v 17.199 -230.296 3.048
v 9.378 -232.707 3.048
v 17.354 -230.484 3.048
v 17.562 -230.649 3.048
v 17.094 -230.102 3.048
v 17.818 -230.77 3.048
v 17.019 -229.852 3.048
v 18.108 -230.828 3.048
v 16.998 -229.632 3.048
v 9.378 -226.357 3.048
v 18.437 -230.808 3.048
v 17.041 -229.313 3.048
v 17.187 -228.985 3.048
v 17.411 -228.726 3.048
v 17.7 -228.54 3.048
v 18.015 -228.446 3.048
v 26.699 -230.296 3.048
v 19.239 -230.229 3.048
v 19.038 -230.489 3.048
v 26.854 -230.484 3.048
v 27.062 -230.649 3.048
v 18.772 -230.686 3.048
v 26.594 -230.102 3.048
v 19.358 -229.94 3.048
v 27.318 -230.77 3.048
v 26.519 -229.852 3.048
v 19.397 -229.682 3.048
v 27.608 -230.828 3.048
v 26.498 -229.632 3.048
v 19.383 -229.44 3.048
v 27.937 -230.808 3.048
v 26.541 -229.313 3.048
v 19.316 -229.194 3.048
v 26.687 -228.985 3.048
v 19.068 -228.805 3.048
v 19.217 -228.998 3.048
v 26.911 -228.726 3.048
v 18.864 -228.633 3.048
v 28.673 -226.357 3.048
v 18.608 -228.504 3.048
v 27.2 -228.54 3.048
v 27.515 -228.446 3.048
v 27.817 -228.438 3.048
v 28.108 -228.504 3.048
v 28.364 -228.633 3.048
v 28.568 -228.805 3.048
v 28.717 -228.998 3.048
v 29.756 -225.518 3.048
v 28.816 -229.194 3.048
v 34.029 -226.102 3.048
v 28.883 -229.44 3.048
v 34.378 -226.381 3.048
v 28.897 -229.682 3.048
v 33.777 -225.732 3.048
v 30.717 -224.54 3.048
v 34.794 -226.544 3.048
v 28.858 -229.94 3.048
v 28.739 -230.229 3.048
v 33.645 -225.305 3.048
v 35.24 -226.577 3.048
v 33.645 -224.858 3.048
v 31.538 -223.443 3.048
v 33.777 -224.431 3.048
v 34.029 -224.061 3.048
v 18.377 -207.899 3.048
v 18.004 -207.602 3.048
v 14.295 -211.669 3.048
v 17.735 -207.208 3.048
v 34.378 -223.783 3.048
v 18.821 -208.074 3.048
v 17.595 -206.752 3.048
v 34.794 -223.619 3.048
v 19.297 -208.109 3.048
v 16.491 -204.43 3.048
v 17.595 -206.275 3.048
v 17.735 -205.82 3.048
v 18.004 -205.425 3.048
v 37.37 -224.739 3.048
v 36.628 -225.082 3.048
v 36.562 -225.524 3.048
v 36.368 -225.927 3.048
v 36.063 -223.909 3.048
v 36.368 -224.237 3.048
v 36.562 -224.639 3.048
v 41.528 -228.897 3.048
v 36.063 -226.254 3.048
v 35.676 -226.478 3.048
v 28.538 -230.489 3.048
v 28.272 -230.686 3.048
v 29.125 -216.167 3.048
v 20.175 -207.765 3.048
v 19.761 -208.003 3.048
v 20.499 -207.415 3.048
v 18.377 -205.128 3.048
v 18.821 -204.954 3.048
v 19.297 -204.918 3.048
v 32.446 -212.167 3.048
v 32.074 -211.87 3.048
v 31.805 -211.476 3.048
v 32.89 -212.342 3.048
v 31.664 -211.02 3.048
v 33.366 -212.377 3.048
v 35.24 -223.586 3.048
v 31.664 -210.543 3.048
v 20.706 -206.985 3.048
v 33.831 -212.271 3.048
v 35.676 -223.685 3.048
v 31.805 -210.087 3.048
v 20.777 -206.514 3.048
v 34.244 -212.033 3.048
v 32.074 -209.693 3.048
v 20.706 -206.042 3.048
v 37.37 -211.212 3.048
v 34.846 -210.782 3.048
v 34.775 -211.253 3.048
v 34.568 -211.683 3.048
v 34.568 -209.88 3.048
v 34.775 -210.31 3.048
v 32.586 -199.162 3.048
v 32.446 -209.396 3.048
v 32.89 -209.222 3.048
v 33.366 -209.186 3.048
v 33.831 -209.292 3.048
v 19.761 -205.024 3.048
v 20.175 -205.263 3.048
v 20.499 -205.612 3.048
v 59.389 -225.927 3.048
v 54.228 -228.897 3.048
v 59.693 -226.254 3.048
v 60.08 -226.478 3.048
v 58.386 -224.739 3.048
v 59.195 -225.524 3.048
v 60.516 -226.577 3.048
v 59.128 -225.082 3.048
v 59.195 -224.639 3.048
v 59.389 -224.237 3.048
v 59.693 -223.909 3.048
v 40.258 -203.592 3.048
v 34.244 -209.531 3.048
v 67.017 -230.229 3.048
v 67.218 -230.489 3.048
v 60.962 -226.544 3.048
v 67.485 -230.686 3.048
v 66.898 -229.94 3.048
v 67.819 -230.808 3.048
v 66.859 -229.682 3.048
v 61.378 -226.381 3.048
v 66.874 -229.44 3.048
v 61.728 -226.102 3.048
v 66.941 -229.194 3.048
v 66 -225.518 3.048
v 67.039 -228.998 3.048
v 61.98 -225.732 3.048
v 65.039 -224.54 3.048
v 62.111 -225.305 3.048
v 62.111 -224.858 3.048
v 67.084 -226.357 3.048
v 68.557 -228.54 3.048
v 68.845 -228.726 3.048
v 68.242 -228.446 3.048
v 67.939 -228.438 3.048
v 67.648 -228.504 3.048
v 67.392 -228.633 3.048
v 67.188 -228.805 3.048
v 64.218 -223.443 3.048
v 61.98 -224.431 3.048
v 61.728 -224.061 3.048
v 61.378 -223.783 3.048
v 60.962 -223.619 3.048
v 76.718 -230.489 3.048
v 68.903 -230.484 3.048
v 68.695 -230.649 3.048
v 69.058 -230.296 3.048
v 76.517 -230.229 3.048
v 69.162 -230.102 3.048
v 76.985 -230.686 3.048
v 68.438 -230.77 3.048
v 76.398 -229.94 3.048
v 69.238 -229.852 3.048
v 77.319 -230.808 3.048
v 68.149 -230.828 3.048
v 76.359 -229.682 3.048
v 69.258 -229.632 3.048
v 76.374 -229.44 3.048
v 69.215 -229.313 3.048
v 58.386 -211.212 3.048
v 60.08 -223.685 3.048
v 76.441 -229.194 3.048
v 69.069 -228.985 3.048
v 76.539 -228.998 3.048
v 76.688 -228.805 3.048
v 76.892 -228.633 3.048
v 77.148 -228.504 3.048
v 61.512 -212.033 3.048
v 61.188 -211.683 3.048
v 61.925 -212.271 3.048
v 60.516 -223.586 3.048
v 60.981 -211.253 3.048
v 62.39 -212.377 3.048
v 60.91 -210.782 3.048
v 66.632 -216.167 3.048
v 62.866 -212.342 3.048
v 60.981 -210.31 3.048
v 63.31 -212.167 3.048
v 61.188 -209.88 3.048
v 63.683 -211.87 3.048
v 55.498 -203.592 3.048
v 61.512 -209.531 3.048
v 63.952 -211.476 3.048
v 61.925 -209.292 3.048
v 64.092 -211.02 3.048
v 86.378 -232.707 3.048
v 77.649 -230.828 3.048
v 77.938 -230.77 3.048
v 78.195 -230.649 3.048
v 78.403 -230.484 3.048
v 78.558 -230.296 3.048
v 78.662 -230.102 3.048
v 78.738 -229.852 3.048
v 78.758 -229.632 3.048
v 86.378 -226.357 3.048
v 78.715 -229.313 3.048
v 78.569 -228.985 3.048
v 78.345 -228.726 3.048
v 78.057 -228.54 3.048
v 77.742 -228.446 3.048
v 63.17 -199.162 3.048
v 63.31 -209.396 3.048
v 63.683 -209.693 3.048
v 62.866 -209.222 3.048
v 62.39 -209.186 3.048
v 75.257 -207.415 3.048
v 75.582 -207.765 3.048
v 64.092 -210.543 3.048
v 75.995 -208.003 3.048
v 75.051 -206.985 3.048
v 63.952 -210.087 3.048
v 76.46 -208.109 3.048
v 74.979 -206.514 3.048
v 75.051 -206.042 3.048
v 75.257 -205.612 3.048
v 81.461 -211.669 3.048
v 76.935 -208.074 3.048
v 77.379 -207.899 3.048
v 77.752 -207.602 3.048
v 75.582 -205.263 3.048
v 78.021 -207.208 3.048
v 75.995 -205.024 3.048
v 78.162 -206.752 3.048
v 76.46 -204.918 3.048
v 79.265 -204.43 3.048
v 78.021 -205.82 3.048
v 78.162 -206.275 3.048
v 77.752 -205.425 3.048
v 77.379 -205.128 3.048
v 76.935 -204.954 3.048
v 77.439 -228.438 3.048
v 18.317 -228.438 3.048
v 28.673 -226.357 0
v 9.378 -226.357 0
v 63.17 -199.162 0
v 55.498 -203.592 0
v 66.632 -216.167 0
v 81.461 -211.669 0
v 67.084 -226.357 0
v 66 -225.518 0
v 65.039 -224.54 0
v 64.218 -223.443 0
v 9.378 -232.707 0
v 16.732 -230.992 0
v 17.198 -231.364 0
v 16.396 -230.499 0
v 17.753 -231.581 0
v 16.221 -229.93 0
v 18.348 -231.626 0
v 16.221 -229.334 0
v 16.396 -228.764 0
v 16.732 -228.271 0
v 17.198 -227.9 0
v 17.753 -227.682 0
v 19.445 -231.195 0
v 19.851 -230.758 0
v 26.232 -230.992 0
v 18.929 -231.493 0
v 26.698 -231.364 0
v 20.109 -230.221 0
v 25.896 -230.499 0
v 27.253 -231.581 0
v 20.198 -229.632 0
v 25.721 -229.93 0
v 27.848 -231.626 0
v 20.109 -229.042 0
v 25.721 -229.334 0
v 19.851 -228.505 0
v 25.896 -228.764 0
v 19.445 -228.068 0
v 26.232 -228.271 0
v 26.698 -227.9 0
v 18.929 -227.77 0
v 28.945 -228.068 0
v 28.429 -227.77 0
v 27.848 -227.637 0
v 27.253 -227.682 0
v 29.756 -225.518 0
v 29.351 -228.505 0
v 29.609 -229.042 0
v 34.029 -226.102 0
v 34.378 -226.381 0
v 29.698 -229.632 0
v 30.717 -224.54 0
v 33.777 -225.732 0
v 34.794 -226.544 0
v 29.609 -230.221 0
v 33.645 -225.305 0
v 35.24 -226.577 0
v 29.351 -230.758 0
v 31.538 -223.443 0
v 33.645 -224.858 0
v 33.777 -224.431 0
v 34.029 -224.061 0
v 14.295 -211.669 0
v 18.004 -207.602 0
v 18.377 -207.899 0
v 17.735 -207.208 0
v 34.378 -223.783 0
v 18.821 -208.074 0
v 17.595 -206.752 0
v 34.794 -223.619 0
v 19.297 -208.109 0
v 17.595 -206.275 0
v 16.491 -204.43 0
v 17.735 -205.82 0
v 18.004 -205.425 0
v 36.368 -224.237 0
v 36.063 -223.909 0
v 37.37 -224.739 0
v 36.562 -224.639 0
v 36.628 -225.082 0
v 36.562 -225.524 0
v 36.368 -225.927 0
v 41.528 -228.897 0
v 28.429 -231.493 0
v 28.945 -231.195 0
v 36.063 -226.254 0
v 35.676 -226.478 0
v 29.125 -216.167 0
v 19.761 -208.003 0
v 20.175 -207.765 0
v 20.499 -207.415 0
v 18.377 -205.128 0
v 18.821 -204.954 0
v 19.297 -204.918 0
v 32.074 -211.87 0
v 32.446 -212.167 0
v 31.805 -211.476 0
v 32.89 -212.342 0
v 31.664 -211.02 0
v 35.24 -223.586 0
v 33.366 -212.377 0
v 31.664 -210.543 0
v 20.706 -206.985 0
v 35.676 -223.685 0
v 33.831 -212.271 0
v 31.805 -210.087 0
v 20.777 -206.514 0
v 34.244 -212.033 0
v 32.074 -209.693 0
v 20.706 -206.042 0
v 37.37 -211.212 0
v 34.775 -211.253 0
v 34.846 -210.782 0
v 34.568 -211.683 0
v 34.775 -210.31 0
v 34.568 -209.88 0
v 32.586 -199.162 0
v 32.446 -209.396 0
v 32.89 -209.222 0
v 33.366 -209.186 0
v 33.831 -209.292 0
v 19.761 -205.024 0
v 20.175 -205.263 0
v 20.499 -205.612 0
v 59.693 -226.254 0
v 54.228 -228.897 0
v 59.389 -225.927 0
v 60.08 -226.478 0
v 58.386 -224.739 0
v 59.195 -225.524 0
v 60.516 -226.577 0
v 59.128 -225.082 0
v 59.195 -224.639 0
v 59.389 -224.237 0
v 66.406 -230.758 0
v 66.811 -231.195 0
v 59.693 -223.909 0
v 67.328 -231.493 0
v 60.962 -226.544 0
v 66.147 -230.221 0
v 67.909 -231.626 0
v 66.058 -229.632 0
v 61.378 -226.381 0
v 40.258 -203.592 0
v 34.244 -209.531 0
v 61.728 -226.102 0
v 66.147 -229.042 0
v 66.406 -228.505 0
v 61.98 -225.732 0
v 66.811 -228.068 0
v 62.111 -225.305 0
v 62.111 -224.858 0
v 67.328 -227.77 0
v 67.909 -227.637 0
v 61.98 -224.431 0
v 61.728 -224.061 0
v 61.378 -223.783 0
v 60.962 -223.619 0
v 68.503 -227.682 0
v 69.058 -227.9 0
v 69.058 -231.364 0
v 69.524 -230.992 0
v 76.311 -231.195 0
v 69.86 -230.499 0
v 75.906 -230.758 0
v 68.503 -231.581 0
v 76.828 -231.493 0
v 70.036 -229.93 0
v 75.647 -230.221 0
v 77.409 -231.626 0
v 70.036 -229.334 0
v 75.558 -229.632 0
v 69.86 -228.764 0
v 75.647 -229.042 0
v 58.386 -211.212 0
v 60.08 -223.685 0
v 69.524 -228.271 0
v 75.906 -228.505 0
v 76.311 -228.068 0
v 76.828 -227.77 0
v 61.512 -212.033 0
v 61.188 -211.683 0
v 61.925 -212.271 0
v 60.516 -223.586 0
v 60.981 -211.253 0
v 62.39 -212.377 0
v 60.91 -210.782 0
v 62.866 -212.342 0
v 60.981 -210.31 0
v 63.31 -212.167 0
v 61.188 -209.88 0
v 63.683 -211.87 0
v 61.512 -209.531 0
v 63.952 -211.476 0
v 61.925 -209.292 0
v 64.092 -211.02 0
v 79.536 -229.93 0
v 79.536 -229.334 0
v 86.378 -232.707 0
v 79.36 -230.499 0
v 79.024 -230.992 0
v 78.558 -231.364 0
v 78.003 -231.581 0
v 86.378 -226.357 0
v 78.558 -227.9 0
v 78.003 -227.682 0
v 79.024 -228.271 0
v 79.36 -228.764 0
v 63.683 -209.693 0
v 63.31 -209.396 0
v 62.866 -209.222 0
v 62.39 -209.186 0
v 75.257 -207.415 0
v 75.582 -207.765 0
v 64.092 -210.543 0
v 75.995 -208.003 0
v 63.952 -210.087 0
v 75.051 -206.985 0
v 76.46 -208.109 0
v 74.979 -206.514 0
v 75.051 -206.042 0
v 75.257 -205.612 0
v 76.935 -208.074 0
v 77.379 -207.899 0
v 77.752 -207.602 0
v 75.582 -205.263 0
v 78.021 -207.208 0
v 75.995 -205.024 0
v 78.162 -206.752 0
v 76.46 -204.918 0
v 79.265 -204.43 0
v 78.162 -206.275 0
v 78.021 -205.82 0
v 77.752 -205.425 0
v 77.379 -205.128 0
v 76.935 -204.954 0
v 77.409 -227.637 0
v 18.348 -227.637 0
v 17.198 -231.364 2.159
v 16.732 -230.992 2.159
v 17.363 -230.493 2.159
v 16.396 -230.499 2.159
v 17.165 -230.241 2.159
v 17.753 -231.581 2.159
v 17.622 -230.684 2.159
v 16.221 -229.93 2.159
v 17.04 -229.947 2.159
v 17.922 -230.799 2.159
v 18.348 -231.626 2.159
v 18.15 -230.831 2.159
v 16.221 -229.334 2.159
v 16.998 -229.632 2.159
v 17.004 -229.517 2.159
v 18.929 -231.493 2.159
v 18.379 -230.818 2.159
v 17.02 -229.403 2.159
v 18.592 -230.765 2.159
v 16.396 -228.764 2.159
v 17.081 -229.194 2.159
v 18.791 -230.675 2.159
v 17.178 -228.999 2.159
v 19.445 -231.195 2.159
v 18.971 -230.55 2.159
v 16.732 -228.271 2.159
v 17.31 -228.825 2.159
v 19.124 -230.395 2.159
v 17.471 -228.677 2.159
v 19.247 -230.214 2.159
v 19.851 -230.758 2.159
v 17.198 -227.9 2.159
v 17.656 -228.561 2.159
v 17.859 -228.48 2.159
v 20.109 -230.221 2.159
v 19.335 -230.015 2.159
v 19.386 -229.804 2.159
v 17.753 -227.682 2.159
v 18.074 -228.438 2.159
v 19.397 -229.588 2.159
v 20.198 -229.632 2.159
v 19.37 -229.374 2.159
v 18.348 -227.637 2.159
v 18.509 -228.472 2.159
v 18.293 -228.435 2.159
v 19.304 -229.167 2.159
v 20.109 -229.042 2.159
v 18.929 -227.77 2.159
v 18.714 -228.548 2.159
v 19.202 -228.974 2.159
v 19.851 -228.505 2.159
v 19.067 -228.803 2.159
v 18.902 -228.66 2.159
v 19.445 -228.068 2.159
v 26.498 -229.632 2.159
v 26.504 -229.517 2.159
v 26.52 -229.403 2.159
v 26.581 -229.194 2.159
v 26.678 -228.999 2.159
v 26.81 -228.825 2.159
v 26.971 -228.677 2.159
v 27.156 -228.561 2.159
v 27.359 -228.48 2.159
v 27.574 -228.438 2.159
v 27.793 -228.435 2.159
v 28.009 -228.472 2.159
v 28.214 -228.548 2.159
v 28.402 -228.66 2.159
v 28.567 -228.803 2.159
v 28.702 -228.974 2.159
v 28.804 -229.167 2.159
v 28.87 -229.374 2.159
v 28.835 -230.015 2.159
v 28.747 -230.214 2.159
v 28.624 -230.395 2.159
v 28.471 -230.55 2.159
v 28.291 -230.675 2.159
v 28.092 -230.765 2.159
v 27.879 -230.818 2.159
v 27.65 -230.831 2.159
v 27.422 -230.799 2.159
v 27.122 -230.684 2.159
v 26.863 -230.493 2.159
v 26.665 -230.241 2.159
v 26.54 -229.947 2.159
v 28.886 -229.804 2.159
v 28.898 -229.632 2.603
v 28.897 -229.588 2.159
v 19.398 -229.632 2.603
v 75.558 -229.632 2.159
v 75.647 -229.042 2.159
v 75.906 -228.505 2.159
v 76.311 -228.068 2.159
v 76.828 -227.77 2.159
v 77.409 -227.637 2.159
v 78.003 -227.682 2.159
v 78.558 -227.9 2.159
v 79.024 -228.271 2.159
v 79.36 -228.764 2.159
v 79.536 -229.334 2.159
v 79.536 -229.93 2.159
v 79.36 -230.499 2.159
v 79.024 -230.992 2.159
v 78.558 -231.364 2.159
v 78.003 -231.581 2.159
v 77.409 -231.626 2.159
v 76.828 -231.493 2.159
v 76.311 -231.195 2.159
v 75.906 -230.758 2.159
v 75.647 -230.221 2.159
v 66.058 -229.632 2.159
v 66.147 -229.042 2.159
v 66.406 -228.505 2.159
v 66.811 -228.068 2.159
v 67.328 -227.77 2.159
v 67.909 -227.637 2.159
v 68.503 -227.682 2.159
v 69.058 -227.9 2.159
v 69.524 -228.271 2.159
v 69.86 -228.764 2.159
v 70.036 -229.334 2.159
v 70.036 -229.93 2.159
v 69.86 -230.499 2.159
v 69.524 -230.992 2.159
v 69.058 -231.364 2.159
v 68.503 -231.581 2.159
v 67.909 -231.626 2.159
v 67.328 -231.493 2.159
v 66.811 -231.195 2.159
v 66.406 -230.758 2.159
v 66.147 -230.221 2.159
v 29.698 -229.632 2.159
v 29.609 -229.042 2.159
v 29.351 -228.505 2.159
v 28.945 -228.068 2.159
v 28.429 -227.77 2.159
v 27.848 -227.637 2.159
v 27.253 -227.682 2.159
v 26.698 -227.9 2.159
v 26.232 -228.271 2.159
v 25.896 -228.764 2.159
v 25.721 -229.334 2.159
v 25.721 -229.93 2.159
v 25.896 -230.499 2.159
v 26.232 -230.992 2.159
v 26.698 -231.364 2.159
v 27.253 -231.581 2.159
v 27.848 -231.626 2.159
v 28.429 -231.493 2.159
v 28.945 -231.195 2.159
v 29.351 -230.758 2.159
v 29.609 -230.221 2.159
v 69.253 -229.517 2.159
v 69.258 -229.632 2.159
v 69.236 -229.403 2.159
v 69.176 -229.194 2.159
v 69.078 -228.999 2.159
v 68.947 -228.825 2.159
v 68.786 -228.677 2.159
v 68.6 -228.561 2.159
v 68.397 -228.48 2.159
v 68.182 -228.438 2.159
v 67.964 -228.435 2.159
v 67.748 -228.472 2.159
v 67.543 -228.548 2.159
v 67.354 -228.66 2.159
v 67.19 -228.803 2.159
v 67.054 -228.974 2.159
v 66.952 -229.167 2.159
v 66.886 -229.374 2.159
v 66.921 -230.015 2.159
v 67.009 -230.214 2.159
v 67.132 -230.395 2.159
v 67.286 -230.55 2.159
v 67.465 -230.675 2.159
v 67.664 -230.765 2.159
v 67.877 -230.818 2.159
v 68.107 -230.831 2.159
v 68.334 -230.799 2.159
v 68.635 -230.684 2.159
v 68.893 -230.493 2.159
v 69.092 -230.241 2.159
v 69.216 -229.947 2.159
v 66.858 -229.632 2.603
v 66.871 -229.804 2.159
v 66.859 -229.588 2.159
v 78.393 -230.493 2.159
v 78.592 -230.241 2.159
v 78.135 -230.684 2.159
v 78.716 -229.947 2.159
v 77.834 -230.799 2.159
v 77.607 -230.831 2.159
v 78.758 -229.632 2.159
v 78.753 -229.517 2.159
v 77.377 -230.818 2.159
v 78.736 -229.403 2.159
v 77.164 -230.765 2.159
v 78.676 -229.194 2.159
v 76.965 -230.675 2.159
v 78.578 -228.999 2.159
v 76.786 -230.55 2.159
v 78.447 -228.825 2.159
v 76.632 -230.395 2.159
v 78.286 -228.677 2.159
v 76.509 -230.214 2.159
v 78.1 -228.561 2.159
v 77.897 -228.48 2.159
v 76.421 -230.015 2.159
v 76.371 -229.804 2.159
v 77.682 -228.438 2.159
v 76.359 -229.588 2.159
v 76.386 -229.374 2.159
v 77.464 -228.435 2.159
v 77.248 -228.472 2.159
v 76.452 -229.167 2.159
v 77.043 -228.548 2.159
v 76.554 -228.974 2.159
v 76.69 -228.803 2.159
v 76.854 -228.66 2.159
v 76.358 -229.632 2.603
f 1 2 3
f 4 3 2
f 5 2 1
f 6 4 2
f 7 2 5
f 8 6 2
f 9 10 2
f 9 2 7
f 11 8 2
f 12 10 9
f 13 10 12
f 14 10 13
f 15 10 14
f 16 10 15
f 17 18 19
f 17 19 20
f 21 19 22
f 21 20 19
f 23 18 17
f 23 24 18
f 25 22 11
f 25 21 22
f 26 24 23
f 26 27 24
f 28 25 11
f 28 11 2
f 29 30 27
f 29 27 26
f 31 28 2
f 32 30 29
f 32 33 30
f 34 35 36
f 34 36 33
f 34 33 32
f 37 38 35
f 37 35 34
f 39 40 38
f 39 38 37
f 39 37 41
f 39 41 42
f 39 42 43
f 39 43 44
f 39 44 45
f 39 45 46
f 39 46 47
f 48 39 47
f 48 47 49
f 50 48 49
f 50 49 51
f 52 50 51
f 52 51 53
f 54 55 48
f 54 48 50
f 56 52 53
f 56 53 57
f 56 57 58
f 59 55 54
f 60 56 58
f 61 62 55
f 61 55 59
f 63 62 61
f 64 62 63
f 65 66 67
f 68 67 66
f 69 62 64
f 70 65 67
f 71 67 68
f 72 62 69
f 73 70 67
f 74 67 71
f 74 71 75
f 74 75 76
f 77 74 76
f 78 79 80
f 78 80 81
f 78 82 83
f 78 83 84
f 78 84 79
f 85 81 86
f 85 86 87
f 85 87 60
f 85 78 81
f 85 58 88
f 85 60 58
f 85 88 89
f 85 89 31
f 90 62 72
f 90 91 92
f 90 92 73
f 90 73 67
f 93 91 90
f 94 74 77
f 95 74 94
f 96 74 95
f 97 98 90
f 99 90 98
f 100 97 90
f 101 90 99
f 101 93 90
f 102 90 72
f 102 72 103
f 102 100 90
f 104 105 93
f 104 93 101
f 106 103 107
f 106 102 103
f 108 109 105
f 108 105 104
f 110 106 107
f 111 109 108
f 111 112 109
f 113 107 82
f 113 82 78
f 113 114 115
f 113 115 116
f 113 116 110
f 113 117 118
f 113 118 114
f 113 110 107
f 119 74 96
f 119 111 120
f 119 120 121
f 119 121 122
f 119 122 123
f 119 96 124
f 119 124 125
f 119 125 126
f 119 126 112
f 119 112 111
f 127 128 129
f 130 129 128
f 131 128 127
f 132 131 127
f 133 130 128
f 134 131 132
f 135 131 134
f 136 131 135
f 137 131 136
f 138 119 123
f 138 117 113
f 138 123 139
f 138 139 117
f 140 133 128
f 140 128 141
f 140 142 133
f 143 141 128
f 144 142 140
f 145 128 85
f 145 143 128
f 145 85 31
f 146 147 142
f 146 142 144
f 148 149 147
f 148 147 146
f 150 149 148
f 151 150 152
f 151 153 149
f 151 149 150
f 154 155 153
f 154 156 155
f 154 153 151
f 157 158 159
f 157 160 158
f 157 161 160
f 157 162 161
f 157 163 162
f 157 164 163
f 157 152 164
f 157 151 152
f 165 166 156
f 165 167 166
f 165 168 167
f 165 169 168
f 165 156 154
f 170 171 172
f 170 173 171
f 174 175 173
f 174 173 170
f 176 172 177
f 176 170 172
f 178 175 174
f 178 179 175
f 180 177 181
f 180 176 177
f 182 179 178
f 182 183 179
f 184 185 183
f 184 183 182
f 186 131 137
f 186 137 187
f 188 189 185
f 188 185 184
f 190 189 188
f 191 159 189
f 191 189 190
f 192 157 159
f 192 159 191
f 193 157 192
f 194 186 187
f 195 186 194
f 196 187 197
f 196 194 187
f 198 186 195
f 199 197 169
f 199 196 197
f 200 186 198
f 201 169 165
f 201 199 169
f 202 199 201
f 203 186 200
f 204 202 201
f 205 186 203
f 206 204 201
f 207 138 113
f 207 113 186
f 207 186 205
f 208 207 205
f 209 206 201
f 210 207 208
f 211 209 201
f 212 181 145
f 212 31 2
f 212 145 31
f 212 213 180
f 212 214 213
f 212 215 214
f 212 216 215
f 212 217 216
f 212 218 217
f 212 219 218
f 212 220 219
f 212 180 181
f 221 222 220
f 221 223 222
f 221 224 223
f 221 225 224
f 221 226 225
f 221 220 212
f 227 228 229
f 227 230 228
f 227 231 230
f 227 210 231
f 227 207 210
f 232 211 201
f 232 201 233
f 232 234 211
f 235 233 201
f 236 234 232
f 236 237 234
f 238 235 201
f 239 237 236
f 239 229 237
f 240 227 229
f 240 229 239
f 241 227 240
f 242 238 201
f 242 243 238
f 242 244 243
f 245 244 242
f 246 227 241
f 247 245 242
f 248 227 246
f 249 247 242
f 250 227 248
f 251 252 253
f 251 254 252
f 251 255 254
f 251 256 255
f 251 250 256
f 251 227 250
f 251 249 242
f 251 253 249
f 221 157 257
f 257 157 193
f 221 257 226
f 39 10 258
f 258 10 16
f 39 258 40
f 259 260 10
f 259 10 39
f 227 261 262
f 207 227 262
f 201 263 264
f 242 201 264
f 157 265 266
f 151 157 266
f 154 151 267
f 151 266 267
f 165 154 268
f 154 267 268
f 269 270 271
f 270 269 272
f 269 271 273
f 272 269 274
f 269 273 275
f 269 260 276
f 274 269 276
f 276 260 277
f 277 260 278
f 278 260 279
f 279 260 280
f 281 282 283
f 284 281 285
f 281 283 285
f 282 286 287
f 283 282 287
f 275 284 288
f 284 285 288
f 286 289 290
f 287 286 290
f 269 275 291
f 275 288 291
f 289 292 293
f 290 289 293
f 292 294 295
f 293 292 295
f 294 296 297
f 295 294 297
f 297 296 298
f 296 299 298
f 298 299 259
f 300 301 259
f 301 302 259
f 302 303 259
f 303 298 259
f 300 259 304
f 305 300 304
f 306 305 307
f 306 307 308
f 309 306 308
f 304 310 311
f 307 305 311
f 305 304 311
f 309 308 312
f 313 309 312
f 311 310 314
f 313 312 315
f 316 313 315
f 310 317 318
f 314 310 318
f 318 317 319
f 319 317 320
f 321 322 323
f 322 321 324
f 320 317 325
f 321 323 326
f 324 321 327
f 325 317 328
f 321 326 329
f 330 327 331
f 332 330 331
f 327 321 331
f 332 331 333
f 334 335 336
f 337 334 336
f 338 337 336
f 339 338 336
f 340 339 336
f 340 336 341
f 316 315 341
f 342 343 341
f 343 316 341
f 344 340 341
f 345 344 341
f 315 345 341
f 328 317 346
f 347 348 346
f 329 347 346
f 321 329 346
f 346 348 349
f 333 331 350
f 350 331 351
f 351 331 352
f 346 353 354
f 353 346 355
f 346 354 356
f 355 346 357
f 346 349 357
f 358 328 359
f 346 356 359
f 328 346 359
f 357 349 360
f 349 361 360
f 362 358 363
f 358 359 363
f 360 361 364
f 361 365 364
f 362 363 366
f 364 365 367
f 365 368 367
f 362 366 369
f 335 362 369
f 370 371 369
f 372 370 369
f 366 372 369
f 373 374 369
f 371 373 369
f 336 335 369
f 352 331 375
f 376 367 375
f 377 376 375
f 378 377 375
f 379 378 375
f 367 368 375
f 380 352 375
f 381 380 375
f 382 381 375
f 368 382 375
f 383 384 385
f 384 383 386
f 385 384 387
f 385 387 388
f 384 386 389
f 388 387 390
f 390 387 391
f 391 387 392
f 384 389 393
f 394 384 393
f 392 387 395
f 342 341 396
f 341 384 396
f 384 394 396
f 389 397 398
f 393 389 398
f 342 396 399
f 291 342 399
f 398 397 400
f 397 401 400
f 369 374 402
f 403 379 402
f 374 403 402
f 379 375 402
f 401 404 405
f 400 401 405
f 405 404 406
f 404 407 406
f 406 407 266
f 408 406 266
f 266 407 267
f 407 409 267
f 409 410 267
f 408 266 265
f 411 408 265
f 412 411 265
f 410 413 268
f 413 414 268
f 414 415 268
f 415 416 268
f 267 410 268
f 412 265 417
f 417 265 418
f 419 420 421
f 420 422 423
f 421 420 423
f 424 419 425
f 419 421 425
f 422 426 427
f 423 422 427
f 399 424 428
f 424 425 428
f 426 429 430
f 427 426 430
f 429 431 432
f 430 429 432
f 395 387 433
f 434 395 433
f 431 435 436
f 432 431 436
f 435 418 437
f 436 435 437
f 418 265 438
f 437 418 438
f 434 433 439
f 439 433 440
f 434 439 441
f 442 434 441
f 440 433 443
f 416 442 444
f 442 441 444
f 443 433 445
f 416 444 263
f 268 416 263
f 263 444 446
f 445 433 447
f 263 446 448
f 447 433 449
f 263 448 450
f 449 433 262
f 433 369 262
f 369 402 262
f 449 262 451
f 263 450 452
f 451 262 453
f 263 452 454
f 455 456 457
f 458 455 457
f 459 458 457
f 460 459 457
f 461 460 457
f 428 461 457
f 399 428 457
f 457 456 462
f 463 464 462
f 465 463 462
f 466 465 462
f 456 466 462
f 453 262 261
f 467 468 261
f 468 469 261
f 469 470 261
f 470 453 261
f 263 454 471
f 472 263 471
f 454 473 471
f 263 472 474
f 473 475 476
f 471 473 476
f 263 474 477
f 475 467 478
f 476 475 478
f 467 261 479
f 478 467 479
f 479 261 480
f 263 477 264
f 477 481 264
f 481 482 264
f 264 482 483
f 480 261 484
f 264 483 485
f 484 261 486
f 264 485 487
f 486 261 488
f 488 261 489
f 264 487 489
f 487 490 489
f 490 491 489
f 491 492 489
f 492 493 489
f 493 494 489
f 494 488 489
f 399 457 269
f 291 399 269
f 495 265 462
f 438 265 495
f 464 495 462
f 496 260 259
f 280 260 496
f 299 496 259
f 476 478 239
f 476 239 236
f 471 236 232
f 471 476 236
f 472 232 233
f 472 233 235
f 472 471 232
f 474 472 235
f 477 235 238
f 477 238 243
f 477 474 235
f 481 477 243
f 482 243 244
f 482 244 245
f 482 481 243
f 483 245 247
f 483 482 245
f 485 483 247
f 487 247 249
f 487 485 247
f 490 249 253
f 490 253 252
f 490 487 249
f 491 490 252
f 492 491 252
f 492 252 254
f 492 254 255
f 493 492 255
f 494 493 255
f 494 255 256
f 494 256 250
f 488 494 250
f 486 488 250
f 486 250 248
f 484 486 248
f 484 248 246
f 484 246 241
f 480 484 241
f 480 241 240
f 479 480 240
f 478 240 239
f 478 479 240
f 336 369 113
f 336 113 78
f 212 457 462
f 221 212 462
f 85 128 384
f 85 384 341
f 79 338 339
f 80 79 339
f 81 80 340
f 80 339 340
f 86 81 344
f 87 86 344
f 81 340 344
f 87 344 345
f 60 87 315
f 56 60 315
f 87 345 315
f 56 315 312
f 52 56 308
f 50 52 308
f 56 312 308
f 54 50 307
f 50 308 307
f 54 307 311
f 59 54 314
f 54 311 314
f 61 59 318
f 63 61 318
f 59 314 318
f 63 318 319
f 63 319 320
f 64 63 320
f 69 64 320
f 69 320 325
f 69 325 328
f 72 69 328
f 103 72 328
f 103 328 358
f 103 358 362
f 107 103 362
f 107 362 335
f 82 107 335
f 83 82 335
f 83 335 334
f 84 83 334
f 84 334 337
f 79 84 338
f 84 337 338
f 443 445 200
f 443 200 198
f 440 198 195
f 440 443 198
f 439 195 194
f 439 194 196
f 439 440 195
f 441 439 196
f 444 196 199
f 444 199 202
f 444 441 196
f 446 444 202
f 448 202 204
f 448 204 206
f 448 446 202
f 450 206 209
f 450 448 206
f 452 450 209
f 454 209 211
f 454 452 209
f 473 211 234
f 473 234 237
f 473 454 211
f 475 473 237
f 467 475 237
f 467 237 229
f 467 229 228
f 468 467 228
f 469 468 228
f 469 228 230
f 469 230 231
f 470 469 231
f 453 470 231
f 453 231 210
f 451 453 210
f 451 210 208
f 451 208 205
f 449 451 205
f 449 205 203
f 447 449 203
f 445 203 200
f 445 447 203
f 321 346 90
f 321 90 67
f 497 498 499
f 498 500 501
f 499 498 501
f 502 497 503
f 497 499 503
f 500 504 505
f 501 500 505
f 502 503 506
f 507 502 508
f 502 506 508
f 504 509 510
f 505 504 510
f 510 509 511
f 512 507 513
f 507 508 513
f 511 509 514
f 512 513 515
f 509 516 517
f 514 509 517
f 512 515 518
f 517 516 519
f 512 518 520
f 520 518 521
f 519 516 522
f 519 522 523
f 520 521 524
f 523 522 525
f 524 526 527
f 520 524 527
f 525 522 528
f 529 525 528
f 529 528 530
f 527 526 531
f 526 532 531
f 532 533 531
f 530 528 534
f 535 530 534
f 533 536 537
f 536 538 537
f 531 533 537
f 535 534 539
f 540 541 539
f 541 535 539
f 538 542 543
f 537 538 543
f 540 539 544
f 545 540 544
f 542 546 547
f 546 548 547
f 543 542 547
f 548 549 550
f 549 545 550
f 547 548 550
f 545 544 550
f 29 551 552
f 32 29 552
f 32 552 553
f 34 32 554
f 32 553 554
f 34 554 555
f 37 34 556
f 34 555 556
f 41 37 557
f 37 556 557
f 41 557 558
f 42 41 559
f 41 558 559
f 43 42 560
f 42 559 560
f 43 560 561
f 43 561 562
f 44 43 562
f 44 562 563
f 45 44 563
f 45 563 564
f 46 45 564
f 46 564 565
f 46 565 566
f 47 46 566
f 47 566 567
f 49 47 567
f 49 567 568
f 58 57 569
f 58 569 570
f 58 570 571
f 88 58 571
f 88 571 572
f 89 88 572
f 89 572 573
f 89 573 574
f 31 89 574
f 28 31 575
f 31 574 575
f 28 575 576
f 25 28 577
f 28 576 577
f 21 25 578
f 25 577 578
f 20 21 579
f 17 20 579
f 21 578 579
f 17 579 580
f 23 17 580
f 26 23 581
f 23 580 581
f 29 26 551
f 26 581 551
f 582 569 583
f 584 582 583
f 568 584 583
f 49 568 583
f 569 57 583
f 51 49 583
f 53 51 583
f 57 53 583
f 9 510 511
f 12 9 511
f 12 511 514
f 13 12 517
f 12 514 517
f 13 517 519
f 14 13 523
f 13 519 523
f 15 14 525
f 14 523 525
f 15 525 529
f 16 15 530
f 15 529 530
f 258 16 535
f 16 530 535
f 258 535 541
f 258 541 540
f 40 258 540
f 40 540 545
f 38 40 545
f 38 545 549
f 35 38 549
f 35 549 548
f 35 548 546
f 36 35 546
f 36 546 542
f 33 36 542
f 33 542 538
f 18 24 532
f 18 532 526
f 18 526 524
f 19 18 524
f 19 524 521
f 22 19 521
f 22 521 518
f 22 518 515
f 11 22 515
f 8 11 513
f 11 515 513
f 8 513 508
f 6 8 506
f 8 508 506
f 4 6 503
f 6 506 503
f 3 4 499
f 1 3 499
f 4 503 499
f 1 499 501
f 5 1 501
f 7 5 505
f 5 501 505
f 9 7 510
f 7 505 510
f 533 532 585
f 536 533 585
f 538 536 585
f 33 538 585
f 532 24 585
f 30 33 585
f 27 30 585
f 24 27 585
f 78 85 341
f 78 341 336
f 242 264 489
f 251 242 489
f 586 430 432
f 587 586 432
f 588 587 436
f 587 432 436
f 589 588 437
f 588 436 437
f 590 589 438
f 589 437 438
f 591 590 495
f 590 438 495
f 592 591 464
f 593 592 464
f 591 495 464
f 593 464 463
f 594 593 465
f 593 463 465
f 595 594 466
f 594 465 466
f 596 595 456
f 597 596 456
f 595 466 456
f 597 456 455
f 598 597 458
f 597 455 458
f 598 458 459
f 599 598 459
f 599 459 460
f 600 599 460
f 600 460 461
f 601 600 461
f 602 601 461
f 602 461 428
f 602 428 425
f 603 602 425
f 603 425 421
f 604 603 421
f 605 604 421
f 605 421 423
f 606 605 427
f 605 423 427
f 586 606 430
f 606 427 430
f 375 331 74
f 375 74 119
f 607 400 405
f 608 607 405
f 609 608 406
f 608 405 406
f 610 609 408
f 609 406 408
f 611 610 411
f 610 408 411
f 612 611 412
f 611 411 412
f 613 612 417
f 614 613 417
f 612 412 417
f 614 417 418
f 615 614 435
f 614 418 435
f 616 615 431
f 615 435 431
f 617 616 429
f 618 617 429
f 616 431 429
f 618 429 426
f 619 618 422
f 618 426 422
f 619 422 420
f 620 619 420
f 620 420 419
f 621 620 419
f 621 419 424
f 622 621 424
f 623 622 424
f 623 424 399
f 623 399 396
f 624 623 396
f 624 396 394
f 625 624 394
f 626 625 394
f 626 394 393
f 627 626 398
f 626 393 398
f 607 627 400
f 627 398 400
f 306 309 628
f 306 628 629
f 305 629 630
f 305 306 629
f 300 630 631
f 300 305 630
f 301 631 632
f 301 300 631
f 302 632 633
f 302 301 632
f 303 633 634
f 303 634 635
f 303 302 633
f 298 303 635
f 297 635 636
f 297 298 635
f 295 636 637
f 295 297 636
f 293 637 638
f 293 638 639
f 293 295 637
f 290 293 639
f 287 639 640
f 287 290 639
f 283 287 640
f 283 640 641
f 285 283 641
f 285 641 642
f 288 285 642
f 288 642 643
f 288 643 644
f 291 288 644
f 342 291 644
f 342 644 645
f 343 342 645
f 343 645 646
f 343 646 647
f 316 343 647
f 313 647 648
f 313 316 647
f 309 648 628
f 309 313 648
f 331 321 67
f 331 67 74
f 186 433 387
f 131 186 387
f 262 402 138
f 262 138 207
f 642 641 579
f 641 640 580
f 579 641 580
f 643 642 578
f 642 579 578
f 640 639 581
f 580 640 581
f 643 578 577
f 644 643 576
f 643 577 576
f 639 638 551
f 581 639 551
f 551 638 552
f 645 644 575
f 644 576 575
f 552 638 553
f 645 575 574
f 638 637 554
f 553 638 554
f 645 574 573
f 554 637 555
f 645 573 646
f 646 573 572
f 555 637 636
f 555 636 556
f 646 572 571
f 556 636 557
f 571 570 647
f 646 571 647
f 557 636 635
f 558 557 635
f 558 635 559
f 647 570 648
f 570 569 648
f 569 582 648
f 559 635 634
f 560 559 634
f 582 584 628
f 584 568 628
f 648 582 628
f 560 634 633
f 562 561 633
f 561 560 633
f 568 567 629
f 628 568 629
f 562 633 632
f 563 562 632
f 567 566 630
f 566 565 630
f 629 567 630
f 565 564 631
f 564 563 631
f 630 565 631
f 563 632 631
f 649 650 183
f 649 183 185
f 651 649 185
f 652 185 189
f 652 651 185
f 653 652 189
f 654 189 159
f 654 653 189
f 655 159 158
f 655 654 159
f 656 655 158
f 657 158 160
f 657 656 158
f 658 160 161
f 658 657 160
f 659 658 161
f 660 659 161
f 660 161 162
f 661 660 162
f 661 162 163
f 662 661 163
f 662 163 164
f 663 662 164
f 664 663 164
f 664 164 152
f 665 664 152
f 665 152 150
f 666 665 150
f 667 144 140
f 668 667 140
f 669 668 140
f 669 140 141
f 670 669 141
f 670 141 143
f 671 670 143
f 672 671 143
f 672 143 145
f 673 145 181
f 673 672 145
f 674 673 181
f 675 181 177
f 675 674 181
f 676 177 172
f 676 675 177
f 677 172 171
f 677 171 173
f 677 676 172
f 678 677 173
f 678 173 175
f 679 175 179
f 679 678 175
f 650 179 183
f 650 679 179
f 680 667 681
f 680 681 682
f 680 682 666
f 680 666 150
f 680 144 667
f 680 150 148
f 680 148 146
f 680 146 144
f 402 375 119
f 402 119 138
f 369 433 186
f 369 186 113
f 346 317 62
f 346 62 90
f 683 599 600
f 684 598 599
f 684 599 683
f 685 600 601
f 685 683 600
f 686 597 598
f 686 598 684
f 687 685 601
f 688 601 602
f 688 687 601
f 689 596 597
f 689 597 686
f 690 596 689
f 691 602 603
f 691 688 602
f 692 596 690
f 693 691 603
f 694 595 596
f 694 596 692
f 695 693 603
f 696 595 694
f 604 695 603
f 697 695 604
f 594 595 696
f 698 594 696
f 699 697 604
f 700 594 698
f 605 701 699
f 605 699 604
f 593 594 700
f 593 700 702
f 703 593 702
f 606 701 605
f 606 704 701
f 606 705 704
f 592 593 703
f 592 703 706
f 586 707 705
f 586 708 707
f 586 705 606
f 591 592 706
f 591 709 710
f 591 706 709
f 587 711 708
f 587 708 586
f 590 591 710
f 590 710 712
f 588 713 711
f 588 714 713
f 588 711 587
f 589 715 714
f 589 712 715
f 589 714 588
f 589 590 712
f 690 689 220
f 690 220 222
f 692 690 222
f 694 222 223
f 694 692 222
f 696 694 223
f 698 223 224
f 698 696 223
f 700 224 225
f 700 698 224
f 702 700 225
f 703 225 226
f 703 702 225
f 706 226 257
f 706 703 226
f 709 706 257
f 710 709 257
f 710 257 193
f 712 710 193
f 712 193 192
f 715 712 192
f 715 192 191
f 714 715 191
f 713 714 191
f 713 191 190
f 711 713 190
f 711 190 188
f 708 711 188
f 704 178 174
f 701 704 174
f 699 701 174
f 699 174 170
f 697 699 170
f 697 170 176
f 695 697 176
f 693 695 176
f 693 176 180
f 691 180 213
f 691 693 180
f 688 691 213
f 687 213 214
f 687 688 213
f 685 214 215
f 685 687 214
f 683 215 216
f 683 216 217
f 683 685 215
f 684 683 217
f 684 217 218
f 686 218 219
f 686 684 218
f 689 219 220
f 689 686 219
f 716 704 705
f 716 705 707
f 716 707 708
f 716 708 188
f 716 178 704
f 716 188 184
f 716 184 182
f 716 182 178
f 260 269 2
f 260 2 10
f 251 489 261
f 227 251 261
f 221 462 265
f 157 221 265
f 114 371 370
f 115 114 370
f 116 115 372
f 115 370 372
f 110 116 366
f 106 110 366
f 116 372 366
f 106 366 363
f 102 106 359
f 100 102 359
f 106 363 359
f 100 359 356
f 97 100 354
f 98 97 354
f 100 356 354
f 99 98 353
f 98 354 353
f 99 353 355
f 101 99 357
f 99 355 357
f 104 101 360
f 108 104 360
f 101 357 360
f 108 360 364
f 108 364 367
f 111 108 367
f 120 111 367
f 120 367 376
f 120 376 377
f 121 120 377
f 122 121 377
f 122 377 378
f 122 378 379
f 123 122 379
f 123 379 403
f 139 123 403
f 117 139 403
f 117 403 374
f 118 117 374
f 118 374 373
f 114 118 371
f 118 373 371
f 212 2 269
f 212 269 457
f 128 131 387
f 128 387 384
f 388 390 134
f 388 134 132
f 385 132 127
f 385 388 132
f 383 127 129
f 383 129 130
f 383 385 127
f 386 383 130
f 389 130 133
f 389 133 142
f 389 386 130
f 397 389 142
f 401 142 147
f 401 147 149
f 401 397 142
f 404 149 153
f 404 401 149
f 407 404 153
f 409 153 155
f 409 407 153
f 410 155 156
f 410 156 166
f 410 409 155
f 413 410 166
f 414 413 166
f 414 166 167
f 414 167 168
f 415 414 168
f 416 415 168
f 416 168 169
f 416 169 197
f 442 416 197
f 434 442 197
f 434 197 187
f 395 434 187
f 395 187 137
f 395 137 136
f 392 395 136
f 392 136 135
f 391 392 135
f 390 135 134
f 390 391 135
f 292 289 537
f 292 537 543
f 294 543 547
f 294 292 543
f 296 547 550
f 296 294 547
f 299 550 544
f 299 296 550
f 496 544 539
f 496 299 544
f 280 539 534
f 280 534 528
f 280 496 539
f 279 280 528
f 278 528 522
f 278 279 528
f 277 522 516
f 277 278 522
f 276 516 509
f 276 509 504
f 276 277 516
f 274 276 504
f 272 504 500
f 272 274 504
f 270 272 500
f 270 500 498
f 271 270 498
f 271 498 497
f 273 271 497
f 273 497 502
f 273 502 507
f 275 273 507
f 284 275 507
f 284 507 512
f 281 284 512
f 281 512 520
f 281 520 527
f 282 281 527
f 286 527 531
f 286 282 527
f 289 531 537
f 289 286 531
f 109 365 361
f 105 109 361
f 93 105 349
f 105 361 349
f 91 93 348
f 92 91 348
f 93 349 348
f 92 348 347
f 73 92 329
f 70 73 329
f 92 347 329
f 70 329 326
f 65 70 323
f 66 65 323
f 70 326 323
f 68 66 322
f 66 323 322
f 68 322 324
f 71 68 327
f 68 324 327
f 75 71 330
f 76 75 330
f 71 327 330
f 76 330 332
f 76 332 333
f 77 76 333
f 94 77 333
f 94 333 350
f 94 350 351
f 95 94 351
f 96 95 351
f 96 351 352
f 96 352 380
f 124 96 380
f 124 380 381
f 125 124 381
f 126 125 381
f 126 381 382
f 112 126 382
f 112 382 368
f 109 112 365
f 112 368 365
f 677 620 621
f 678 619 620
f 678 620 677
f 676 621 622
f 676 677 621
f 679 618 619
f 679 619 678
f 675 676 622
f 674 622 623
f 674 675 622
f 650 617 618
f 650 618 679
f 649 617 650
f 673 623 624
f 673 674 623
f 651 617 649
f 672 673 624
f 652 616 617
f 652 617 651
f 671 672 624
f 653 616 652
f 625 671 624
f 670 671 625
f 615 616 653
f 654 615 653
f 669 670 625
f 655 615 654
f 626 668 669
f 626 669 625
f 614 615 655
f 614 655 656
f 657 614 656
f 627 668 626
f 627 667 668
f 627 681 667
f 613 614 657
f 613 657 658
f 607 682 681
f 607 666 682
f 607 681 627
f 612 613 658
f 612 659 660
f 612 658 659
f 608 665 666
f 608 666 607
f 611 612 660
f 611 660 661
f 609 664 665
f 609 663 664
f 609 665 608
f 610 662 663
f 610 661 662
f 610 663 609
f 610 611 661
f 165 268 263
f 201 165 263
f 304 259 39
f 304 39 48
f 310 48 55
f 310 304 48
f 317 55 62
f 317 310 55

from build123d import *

# Parameters (mm, degrees)
SKETCH1_R           = 1.5
SKETCH1_R_2         = 1.6
BOSS_EXTRUDE1_DEPTH = 3.048
SKETCH2_R           = 2
CUT_EXTRUDE1_DEPTH  = 2.159
BOSS_EXTRUDE2_DEPTH = 3.048


with BuildPart() as part:
    # Sketch1 → Boss-Extrude1 (new body)
    with BuildSketch(Plane.XY):
        with BuildLine():
            Line((79.265356566, -204.430419713), (63.170457618, -199.16202177))
            Line((63.170457618, -199.16202177), (55.498201994, -203.59160062))
            Line((55.498201994, -203.59160062), (47.878201994, -203.59160062))
            Line((47.878201994, -203.59160062), (47.878201994, -211.21160062))
            Line((47.878201994, -211.21160062), (58.386201994, -211.21160062))
            Line((58.386201994, -211.21160062), (58.386201994, -232.70660062))
            Line((58.386201994, -232.70660062), (86.378201994, -232.70660062))
            Line((86.378201994, -232.70660062), (86.378201994, -226.35660062))
            Line((86.378201994, -226.35660062), (67.083766093, -226.35660062))
            ThreePointArc((67.083766093, -226.35660062), (65.503026614, -225.045162417), (64.21834769, -223.442599621))
            Line((64.21834769, -223.442599621), (66.631816904, -216.167059283))
            Line((66.631816904, -216.167059283), (81.461052688, -211.668659788))
            Line((81.461052688, -211.668659788), (79.265356566, -204.430419713))
        make_face()
        with BuildLine():
            add(Edge.make_bspline(
                [(69.258201994, -229.63160062), (69.258201994, -227.23160062), (66.858201994, -227.23160062), (66.858201994, -229.63160062), (66.858201994, -232.03160062), (69.258201994, -232.03160062), (69.258201994, -229.63160062)],
                knots=[0, 0, 0, 0, 0.5, 0.5, 0.5, 1, 1, 1, 1], degree=3, weights=[1, 0.333333333, 0.333333333, 1, 0.333333333, 0.333333333, 1]))
        make_face(mode=Mode.SUBTRACT)
        with Locations(Location((60.628201973, -225.081600518, 0), (0, 0, 180))):
            Circle(SKETCH1_R, mode=Mode.SUBTRACT)
        with BuildLine():
            add(Edge.make_bspline(
                [(78.758201994, -229.63160062), (78.758201994, -227.23160062), (76.358201994, -227.23160062), (76.358201994, -229.63160062), (76.358201994, -232.03160062), (78.758201994, -232.03160062), (78.758201994, -229.63160062)],
                knots=[0, 0, 0, 0, 0.5, 0.5, 0.5, 1, 1, 1, 1], degree=3, weights=[1, 0.333333333, 0.333333333, 1, 0.333333333, 0.333333333, 1]))
        make_face(mode=Mode.SUBTRACT)
        with Locations(Location((62.509976145, -210.781673598, 0), (0, 0, 180))):
            Circle(SKETCH1_R_2, mode=Mode.SUBTRACT)
        with Locations(Location((76.579459421, -206.513742506, 0), (0, 0, 180))):
            Circle(SKETCH1_R_2, mode=Mode.SUBTRACT)
    extrude(amount=BOSS_EXTRUDE1_DEPTH)

    # Sketch2 → Cut-Extrude1 (cut)
    with BuildSketch(Plane(origin=(0, 0, 0), x_dir=(-1, 0, 0), z_dir=(0, 0, -1))):
        with Locations((-77.558201994, -229.63160062)):
            Circle(SKETCH2_R)
        with Locations((-68.058201994, -229.63160062)):
            Circle(SKETCH2_R)
    extrude(amount=-CUT_EXTRUDE1_DEPTH, mode=Mode.SUBTRACT)

    # Mirror1: part across plane


with BuildPart() as part_1:
    add(part.part)
    add(part.part.mirror(Plane(origin=(47.878201994, 0, 3.048), x_dir=(0, 0, 1), z_dir=(1, 0, 0))))

    # Sketch3 → Boss-Extrude2 (add)
    with BuildSketch(Plane.XY.offset(3.048)):
        Polygon((41.528201994, -228.89660062), (37.370201994, -224.73860062), (37.370201994, -232.70660062), (58.386201994, -232.70660062), (58.386201994, -224.73860062), (54.228201994, -228.89660062), align=None)
    extrude(amount=-BOSS_EXTRUDE2_DEPTH)


solid = part_1.part
